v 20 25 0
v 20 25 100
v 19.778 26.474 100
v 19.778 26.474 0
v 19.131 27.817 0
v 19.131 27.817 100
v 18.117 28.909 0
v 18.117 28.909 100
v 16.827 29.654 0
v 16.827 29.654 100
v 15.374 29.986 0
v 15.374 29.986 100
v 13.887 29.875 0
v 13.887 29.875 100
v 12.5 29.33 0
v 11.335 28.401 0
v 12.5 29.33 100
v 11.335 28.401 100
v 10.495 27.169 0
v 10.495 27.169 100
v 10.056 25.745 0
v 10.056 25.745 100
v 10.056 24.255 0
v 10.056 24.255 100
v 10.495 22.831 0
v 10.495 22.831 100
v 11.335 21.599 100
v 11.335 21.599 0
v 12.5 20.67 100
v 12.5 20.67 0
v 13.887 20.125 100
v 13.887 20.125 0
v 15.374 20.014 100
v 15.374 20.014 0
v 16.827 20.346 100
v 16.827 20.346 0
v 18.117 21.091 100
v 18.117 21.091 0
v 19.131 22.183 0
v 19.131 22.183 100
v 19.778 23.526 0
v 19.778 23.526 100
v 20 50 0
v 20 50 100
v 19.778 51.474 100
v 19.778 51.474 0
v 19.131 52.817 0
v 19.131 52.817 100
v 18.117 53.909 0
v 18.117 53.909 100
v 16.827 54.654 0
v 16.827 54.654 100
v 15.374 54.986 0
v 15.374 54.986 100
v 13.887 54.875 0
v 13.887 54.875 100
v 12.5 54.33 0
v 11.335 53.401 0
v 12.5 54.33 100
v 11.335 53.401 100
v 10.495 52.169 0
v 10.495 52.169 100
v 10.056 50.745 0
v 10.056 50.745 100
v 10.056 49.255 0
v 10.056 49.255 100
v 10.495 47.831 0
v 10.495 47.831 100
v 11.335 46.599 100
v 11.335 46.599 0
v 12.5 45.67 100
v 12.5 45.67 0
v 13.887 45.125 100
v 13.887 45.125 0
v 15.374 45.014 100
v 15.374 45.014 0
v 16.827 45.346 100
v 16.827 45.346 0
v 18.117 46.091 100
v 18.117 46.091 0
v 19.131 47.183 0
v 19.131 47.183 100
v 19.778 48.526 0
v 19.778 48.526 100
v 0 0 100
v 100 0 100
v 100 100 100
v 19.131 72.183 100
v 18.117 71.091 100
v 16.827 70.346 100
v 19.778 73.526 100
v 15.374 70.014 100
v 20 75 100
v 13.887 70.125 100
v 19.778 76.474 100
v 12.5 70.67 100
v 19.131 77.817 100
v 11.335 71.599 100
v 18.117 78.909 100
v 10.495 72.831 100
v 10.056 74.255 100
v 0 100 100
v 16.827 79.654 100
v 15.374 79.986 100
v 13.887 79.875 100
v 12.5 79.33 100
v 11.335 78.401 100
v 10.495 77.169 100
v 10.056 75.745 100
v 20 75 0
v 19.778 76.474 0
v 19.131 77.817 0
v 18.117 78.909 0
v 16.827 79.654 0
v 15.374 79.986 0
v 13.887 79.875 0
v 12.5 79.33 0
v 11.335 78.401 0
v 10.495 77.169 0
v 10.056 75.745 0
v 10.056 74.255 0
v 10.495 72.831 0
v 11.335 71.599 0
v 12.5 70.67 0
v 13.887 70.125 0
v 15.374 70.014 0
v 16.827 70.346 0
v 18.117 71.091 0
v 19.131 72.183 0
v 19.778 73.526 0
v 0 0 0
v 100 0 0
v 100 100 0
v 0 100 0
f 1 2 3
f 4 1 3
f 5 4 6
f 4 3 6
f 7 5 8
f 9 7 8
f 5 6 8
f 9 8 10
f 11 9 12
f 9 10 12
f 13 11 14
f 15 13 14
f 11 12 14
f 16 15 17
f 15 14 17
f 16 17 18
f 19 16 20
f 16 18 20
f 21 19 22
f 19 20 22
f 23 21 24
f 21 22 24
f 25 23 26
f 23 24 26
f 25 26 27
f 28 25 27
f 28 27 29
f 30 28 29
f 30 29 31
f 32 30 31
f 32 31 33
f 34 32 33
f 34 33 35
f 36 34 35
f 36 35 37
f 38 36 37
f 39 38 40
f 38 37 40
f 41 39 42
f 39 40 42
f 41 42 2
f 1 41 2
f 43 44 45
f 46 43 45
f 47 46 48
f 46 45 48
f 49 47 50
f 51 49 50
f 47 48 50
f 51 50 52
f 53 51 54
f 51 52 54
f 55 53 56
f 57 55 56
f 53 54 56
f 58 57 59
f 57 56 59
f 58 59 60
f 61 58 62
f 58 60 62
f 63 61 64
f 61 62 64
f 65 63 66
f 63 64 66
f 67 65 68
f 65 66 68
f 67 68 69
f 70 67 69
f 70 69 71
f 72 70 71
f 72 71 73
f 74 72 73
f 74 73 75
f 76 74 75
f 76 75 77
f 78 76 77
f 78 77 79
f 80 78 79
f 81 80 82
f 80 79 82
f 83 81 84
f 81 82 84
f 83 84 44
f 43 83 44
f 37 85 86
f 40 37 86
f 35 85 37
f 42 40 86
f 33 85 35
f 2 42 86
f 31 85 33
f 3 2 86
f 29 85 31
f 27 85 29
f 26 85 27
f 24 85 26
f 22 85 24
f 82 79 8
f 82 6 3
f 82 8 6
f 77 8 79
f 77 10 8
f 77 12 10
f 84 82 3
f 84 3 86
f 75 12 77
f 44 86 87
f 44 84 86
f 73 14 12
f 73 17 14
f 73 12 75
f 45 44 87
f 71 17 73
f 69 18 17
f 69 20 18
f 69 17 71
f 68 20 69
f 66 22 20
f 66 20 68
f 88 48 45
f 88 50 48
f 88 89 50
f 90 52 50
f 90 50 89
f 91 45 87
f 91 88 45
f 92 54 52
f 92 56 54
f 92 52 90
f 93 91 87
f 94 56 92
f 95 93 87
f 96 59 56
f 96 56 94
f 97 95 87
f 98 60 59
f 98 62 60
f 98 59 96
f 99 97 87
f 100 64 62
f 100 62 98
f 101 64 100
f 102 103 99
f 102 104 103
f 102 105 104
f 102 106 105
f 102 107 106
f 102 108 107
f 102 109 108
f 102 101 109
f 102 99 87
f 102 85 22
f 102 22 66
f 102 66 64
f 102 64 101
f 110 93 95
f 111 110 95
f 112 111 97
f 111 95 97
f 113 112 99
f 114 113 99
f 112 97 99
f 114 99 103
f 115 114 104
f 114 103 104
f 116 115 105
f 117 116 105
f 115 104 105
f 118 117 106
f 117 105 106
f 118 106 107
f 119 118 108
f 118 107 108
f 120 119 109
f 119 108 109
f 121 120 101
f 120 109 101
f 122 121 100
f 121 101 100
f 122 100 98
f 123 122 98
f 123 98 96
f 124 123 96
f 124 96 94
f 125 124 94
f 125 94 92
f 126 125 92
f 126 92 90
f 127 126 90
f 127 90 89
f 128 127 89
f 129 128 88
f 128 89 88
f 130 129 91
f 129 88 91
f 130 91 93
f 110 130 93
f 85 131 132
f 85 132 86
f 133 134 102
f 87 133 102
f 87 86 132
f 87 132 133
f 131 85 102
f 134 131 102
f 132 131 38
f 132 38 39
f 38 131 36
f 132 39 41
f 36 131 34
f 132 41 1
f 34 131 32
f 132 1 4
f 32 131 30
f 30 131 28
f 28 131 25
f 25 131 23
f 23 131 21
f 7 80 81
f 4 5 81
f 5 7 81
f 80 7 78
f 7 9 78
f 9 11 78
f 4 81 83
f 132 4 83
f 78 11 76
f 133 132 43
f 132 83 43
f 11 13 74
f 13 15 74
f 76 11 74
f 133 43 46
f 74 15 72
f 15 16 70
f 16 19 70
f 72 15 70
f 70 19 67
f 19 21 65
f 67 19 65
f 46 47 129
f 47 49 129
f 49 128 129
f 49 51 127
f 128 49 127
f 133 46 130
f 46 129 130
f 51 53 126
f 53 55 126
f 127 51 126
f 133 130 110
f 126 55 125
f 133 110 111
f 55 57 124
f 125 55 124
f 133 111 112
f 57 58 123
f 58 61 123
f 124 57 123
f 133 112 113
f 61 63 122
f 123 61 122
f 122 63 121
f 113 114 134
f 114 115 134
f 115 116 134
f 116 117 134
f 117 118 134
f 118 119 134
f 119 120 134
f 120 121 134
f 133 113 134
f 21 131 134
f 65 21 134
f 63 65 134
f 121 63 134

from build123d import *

# Parameters (mm, degrees)
F0_W     = 100
F0_H     = 100
F1_DEPTH = 100
F2_R     = 5
F3_DEPTH = 100


with BuildPart() as f1:
    # F0 (on Right) → F1 (new body)
    with BuildSketch(Plane.YZ):
        with Locations((50, 50)):
            Rectangle(F0_W, F0_H)
    extrude(amount=F1_DEPTH)

    # F2 (on face) → F3 (cut)
    with BuildSketch(Plane.XY.offset(100)):
        with Locations((15, 25)):
            Circle(F2_R)
        with Locations((142.386928, 39.02828)):
            Circle(F2_R)
        with Locations((15, 50)):
            Circle(F2_R)
        with Locations((15, 75)):
            Circle(F2_R)
    extrude(amount=-F3_DEPTH, mode=Mode.SUBTRACT)


solid = f1.part
